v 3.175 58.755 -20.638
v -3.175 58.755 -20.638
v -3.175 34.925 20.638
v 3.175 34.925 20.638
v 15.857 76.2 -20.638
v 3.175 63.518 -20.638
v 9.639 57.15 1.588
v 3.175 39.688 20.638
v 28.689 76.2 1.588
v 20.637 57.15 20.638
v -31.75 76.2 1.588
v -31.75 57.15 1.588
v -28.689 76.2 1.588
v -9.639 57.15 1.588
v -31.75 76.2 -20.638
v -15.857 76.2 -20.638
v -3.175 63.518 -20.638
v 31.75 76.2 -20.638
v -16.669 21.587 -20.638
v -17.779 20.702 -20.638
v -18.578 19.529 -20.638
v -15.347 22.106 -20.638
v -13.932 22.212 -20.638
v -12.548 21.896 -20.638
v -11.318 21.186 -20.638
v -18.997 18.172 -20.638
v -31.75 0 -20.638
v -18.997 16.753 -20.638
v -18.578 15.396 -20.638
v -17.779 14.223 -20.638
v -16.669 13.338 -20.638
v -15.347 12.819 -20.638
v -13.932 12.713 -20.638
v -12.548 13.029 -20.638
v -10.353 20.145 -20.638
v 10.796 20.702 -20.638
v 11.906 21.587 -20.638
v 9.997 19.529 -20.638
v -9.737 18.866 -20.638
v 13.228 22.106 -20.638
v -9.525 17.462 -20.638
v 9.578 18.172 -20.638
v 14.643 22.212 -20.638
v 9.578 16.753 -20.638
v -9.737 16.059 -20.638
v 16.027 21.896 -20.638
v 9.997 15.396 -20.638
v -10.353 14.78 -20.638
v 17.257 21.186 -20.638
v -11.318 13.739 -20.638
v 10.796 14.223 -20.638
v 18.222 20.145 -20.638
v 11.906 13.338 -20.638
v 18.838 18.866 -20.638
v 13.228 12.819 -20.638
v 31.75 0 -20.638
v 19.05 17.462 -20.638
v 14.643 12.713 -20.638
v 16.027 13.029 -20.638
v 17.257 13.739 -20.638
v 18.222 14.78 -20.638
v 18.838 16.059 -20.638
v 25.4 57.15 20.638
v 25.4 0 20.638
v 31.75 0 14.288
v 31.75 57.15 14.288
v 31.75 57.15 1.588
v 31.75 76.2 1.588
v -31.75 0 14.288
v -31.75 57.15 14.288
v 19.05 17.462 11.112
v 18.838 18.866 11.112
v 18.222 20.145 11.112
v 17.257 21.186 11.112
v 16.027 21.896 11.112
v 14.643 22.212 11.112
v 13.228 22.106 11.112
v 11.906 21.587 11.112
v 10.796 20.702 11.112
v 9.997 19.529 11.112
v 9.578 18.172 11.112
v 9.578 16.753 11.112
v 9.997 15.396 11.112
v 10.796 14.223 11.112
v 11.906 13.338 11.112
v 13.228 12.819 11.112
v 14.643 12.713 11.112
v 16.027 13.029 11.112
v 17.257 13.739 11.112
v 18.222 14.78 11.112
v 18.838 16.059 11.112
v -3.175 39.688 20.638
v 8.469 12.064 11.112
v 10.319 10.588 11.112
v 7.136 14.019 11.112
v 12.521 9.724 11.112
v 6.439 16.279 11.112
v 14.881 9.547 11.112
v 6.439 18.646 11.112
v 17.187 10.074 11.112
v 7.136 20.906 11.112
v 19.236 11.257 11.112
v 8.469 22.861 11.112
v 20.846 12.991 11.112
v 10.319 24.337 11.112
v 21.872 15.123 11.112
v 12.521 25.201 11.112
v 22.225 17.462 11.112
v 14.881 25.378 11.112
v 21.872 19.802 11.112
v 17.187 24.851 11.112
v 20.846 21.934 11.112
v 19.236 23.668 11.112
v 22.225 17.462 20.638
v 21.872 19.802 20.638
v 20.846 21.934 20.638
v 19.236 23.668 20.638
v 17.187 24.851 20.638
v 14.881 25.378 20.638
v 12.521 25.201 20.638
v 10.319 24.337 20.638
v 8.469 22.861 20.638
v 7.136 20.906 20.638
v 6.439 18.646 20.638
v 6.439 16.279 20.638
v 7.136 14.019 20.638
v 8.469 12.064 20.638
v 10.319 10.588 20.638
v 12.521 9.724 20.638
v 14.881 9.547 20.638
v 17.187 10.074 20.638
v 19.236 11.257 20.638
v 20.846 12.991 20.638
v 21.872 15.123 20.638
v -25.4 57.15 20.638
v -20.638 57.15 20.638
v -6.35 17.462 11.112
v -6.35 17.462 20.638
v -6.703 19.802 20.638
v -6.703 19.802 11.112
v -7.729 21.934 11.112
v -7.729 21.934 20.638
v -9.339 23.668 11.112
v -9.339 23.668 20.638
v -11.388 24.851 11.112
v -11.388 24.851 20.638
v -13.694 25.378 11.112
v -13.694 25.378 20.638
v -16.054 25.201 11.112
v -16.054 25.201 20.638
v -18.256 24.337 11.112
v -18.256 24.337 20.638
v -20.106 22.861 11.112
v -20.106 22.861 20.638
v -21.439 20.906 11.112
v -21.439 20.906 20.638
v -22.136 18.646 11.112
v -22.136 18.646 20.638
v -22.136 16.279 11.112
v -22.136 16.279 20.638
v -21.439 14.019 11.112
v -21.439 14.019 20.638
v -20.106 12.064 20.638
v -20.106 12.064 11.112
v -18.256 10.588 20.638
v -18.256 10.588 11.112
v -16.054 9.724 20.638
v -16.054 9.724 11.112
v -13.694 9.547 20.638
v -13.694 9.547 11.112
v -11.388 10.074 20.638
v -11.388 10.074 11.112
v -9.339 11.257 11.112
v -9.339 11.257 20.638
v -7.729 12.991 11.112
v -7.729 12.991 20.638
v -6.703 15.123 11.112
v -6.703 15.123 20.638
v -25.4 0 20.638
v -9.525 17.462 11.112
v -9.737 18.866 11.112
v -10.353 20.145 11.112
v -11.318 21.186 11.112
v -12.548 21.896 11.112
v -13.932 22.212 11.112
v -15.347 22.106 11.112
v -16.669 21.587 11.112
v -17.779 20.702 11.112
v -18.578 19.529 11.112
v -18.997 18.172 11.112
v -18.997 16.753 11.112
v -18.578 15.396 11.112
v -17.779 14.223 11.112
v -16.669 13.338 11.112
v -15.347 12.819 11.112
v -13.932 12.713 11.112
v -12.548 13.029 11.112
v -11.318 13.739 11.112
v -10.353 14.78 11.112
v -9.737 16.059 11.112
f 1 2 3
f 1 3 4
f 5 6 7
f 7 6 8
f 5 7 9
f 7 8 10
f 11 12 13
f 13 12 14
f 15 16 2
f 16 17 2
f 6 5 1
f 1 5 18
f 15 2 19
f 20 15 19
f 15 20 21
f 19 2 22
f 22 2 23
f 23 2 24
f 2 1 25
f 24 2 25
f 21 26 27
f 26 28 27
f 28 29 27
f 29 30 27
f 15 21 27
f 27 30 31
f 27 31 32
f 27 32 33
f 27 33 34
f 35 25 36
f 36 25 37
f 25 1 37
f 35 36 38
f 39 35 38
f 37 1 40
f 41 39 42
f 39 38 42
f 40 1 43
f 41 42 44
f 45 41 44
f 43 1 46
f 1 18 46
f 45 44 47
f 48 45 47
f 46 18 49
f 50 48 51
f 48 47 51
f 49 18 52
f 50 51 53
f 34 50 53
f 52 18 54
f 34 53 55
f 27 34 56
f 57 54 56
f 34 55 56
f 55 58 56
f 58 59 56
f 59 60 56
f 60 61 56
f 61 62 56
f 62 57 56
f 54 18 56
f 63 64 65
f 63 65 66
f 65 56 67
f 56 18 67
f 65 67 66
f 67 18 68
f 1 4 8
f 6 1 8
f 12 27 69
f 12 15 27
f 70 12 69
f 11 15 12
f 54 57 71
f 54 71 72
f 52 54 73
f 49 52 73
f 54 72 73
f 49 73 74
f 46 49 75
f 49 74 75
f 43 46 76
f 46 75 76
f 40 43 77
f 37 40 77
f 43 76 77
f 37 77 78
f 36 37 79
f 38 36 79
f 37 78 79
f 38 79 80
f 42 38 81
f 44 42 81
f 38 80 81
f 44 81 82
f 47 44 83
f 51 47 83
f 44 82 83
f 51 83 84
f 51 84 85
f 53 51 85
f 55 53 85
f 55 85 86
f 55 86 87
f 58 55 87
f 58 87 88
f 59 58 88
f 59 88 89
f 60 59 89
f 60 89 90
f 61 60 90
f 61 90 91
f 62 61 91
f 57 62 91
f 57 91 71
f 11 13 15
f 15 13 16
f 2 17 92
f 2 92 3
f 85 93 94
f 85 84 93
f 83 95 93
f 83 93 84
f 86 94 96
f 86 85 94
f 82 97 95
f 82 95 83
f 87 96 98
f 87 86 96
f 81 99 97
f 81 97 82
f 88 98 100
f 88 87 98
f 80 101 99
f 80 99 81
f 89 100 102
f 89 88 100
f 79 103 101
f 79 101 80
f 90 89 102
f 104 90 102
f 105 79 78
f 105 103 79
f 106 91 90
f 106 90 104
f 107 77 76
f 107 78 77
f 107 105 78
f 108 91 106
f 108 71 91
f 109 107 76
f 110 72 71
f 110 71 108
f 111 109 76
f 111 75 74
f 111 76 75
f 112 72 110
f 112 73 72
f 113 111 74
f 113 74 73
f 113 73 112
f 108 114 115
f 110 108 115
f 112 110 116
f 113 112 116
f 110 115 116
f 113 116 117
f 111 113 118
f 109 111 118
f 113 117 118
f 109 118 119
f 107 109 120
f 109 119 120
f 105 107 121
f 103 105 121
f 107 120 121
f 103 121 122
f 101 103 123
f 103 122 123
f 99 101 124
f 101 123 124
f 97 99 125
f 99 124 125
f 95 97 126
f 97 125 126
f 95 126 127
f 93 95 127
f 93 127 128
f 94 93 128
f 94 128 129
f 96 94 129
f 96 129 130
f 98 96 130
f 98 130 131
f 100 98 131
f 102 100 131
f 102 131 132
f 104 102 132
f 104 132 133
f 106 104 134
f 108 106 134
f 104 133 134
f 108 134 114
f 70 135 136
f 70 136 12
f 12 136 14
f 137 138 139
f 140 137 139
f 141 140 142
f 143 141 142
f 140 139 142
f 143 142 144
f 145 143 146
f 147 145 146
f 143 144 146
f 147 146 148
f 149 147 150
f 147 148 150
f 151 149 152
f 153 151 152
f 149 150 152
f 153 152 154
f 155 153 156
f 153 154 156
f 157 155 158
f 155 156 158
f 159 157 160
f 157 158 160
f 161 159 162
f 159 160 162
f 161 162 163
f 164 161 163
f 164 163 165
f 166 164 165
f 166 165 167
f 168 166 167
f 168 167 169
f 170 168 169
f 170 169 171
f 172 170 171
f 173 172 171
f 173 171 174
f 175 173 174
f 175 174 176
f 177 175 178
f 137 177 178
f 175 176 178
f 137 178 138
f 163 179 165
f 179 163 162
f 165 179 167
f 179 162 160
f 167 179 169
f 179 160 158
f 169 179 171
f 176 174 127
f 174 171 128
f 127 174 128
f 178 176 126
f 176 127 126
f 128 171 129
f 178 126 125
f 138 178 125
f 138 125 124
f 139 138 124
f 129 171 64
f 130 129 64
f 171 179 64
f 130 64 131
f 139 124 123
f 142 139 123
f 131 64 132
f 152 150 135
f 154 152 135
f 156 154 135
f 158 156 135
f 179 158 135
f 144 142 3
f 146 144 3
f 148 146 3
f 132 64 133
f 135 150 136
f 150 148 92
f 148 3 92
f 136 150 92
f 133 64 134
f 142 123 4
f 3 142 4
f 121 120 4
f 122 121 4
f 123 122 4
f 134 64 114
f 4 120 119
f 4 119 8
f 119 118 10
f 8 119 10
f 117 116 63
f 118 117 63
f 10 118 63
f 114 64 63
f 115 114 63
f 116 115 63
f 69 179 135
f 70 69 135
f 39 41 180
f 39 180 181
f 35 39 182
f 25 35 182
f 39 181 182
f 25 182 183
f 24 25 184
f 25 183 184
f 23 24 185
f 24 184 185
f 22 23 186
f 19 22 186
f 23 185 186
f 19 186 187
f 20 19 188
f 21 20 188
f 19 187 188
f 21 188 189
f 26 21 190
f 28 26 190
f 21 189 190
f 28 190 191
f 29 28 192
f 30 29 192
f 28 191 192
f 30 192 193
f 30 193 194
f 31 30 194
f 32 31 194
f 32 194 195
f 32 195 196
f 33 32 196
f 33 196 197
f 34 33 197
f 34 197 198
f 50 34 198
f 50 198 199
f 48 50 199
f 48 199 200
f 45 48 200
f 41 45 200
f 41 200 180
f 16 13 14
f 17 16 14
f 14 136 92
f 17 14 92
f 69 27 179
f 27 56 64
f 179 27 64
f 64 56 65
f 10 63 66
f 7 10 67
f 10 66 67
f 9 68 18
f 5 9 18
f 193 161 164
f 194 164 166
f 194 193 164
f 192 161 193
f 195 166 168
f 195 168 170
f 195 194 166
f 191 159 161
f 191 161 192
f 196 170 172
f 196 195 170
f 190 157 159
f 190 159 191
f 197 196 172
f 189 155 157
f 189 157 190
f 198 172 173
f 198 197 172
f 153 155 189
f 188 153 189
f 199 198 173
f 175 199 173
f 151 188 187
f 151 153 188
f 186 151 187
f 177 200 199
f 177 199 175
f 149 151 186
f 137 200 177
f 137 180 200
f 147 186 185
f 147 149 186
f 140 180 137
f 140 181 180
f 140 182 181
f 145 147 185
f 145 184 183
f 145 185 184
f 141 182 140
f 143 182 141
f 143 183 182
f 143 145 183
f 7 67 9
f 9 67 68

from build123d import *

# Parameters (mm, degrees)
BOSS_EXTRUDE1_DEPTH = 31.75
SKETCH2_R           = 7.9375
CUT_EXTRUDE1_DEPTH  = 9.525
SKETCH2_4_R         = 4.7625
CUT_EXTRUDE2_DEPTH  = 93.293705771
CUT_EXTRUDE3_DEPTH  = 107.726292282
CHAMFER1_SIZE       = 6.35


with BuildPart() as part:
    # Sketch1 → Boss-Extrude1 (new, symmetric)
    with BuildSketch(Plane(origin=(0, 0, 0), x_dir=(0, 0, -1), z_dir=(1, 0, 0))):
        Polygon((20.6375, 76.2), (20.6375, 0), (-20.6375, 0), (-20.6375, 57.15), (-1.5875, 57.15), (-1.5875, 76.2), align=None)
    extrude(amount=BOSS_EXTRUDE1_DEPTH, both=True)

    # Sketch2 → Cut-Extrude1 (cut)
    with BuildSketch(Plane.XY.offset(20.6375)):
        with Locations((14.2875, 17.4625)):
            Circle(SKETCH2_R)
        with Locations((-14.2875, 17.4625)):
            Circle(SKETCH2_R)
    extrude(amount=-CUT_EXTRUDE1_DEPTH, mode=Mode.SUBTRACT)

    # Sketch2<4> → Cut-Extrude2 (cut, through all)
    with BuildSketch(Plane.XY.offset(20.6375)):
        with Locations((14.2875, 17.4625)):
            Circle(SKETCH2_4_R)
        with Locations((-14.2875, 17.4625)):
            Circle(SKETCH2_4_R)
    extrude(amount=-CUT_EXTRUDE2_DEPTH, mode=Mode.SUBTRACT)

    # Sketch3 → Cut-Extrude3 (cut, through all, along a direction that is not the sketch's normal)
    with BuildSketch(Plane.XY.offset(20.6375)):
        Polygon((-39.6875, 76.2), (-3.175, 39.6875), (-3.175, 34.925), (3.175, 34.925), (3.175, 39.6875), (39.6875, 76.2), align=None)
    extrude(amount=-CUT_EXTRUDE3_DEPTH, dir=(0, -0.49999999999999806, 0.8660254037844398), mode=Mode.SUBTRACT)

    # Chamfer1
    chamfer1_edges = [part.edges().sort_by_distance(p)[0] for p in [
        (-31.75, 28.575, 20.6375),
        (31.75, 28.575, 20.6375),
    ]]
    chamfer(chamfer1_edges, length=CHAMFER1_SIZE)


solid = part.part
